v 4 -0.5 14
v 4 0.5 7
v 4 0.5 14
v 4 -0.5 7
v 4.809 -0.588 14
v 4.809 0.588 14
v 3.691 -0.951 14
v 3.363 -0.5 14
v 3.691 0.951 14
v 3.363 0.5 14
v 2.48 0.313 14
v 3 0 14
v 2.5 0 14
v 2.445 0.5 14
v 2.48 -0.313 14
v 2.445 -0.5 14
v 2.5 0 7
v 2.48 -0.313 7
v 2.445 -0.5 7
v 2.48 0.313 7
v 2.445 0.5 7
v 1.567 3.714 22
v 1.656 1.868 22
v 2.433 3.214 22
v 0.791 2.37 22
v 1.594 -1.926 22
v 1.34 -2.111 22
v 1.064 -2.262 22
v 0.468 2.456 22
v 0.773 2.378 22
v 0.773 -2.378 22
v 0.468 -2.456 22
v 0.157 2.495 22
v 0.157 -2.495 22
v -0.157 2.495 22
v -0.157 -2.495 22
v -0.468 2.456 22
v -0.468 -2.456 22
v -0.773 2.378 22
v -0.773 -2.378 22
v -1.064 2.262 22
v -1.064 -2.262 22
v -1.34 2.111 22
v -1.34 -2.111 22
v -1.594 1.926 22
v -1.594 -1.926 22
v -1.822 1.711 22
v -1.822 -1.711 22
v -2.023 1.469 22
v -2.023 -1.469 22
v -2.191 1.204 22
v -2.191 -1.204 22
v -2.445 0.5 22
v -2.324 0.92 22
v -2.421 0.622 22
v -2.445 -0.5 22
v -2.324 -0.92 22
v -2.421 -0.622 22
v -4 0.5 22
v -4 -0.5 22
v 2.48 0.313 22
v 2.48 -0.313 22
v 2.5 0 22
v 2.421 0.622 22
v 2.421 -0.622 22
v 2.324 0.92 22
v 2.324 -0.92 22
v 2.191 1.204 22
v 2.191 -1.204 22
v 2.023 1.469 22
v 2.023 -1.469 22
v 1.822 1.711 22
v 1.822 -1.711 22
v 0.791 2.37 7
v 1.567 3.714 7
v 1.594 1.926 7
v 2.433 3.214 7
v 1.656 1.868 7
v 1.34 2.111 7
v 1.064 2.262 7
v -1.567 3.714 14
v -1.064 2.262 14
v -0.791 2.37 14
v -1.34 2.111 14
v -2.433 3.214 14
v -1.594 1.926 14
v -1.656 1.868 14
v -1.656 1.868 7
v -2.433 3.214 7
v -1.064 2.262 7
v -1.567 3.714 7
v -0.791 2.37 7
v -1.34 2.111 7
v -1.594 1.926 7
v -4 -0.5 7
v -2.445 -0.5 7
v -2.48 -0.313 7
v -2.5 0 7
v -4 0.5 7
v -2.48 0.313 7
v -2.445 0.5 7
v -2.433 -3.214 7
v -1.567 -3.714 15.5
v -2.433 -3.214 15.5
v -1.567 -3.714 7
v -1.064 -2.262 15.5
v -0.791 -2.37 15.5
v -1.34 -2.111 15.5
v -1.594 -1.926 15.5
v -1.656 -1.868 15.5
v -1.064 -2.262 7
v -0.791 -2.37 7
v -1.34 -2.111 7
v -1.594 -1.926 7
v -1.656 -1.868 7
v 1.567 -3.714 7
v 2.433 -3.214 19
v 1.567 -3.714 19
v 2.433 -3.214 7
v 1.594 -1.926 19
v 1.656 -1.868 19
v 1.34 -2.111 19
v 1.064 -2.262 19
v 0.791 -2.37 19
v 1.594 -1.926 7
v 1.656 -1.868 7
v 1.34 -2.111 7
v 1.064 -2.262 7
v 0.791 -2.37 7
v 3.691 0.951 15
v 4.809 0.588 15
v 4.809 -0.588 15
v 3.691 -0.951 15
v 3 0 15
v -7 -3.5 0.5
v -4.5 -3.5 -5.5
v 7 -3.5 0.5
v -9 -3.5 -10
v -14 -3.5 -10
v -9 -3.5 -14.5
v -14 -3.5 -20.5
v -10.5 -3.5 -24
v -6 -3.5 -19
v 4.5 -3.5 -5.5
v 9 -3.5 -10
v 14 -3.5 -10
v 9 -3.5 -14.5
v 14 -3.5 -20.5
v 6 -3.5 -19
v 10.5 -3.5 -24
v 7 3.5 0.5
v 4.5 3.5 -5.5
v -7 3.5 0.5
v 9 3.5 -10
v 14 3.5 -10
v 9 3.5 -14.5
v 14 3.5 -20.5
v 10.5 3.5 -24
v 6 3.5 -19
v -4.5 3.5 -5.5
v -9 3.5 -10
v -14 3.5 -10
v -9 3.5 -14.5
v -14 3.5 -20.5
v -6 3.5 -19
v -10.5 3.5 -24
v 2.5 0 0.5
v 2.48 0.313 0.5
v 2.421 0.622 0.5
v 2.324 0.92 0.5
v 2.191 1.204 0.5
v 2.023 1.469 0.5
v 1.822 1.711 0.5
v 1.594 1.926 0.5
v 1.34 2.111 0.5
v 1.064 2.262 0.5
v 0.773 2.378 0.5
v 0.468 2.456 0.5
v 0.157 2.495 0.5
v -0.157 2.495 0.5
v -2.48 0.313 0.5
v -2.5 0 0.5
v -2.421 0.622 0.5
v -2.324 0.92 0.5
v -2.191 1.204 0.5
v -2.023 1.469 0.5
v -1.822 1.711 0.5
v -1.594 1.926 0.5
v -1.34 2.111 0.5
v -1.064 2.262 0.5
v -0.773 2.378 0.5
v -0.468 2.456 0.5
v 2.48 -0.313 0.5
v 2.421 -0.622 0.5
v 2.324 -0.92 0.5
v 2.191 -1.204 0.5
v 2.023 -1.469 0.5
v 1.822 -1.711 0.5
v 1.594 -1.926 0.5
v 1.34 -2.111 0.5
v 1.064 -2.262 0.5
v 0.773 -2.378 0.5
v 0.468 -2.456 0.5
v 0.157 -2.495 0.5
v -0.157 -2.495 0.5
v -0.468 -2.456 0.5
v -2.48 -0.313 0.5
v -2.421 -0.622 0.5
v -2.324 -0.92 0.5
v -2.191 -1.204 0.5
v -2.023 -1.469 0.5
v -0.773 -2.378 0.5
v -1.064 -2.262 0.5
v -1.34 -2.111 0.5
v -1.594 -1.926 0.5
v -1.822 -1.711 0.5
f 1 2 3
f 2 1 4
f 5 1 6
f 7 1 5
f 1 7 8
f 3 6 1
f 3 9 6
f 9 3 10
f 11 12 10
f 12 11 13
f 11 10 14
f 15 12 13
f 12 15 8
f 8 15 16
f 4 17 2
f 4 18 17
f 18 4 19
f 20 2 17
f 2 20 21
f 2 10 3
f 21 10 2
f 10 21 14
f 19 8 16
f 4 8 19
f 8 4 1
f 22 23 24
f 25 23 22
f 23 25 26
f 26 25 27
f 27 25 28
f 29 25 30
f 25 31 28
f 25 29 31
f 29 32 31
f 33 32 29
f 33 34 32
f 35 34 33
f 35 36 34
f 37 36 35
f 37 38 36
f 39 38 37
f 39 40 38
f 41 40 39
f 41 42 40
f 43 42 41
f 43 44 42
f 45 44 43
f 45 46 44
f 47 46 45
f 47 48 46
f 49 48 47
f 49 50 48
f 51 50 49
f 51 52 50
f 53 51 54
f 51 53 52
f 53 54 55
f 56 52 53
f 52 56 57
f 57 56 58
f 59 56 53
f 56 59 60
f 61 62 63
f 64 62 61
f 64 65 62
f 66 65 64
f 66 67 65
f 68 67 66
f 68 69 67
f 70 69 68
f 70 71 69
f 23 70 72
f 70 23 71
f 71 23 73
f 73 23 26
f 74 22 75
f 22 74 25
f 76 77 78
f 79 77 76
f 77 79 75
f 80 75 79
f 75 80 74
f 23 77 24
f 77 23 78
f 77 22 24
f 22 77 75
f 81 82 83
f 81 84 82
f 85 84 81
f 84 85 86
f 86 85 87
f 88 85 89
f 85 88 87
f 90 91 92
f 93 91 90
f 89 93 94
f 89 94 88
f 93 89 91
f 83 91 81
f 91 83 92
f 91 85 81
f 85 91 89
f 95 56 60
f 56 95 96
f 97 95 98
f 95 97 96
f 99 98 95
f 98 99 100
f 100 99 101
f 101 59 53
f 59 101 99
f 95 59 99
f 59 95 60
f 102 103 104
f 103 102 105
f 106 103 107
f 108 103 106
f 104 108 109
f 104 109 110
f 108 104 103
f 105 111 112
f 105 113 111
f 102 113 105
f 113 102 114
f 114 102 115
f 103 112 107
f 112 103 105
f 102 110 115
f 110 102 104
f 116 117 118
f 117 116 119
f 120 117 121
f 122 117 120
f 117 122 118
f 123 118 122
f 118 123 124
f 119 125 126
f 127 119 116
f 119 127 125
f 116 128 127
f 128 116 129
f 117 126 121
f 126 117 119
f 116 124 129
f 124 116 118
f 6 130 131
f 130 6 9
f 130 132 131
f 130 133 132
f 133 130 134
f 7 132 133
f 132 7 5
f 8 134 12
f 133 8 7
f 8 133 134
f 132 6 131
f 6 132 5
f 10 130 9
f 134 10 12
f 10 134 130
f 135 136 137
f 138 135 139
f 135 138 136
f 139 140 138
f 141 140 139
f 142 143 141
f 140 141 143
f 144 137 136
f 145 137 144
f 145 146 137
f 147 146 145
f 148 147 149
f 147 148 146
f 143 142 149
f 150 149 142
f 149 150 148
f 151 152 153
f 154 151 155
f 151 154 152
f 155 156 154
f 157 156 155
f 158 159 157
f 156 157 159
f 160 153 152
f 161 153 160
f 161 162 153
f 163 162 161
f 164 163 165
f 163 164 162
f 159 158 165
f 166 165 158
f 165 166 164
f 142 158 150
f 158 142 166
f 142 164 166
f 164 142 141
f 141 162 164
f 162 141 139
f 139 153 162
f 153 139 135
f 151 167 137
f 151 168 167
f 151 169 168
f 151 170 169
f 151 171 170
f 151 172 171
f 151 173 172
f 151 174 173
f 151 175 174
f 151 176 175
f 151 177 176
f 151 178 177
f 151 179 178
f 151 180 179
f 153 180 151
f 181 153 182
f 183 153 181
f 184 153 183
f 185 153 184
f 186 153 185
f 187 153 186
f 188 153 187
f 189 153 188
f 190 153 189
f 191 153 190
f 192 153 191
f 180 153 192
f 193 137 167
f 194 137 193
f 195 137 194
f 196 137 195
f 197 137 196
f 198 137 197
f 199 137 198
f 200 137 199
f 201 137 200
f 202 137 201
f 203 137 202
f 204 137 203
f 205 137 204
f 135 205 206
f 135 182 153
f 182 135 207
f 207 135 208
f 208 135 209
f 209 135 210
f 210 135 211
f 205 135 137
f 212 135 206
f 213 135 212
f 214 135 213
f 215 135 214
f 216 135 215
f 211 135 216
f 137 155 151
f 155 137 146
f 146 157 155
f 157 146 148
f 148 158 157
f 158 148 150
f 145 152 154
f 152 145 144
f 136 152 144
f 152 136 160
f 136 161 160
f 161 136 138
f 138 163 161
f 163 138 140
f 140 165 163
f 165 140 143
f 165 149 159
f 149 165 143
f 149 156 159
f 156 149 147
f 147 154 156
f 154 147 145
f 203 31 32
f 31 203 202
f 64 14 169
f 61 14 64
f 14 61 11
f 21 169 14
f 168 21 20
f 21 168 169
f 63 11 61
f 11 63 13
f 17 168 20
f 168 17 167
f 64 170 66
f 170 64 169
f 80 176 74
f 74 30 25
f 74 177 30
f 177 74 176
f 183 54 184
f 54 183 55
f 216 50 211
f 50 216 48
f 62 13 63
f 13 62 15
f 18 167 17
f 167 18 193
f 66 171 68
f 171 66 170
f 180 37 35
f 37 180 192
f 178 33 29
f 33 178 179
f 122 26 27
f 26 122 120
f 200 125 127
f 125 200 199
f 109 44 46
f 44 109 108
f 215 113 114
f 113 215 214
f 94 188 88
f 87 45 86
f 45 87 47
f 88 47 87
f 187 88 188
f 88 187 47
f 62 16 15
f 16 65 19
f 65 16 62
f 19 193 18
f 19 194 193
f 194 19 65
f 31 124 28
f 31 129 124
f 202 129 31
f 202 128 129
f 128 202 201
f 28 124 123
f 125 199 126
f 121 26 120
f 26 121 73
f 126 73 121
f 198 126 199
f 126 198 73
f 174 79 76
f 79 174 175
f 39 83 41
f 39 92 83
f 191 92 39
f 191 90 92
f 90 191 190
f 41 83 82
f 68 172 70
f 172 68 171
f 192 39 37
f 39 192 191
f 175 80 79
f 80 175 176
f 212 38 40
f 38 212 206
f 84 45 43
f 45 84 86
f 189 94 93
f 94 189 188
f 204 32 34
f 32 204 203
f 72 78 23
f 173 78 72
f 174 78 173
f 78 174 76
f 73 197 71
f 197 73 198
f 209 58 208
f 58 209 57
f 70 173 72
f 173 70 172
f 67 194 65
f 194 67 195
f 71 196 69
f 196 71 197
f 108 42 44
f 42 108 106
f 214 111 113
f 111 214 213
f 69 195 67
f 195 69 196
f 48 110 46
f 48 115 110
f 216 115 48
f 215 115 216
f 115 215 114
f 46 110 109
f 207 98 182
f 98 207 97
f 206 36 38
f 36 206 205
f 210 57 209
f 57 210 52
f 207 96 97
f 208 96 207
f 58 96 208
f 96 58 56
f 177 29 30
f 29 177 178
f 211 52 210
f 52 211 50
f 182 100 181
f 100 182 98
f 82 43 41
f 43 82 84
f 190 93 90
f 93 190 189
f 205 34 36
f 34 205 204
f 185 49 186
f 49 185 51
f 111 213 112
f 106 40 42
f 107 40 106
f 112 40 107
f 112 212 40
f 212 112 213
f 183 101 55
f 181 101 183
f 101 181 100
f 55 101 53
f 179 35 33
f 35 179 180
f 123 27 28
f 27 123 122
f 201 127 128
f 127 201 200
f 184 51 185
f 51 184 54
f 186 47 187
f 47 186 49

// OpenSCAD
// Documentation Générer une clef Cavith Cavers
// =========================
//
// création d'une copie d'une clef cavith basée sur les coupes en mm
// paramètres :
// un, deux, trois, quatre, cinq, [0,1,2]
//
// manche: bool, de base true si on le specifie à false, créer un petit manche pour des impréssions plus rapide
//
// Vue de face de la clef :
//
//          ()
//       4     3    
//       5     2
//          1
//
// Utilisation:
// ------
//
// appel du module :
//
//     clef_cavith(un, deux, trois, quatre, cinq, [2,3,4]);
//
// Example:
// --------
//
//     clef_cavith(8,0,8,6.5,[2,1,4]);
//     clef_cavith(8,0,8,6.5,[2,1,4], manche=false);

module clef_cavith(un, deux, trois, quatre, cinq, dimple_cuts, manche=true){
    union() {
       rotate([0,0,90]){ 
            if (manche) {
                // Handle
                rotate([0, 90, 0]) translate([10, 0, - 3.5]) {
                    linear_extrude(7) {
                        difference() {
                            scale(0.7) polygon(points = [[- 15, - 10], [0, - 20], [15, - 20], [20, - 15], [20, 15], [15, 20]
                                , [0, 20], [- 15, 10]]);
                            scale(0.3) polygon(points = [[- 15, - 15], [0, - 30], [15, - 30], [30, - 20], [30, 20], [15, 30]
                                , [0, 30], [- 15, 15]]);
                        }
                    }
                }
            }
            else {
                //small handle
                translate([- 4, - 7, - 5]) cube([8, 14, 5]);
            }
        }
        // shape kiz
            
        cylinder(22, 2.5, 2.5, $fn = 50);  // Outer cylinder
        // ajout des barres de combinaison de la clef ( 6 barres, 360°/6 pour l'angle de rotation entre chaque barre, la 4 est celle des coupes de goupilles
        translate([0,0,22-15]){
            blankHeight = 15; 
            // barre 1
            translate([2,-0.5,0]) cube([2, 1, blankHeight-un]);
            // barre 2
            rotate([0,0,60]) translate([2,-0.5,0]) cube([2, 1, blankHeight-deux]);
            // barre 3
            rotate([0,0,60*2]) translate([2,-0.5,0]) cube([2, 1, blankHeight-trois]);
            // barre 4
            rotate([0,0,60*3]) translate([2,-0.5,0]) cube([2, 1, blankHeight]);
            // barre 5
            rotate([0,0,60*4]) translate([2,-0.5,0]) cube([2, 1, blankHeight-quatre]);
            // barre 6
            rotate([0,0,60*5]) translate([2,-0.5,0]) cube([2, 1, blankHeight-cinq]);
        }
        // now cutting the dimple
        rotate([0,0,60*3]){
            cylinder([2,0.1,2.5]);
            translate([-dimple_cuts[1],0,22-8]) cylinder([2,0.1,2.5]);
            translate([-dimple_cuts[2],0,22-12]) cylinder([2,0.1,2.5]);
            }
    }
}

clef_cavith(8,0,8,6.5,3,[2,4,1]);
